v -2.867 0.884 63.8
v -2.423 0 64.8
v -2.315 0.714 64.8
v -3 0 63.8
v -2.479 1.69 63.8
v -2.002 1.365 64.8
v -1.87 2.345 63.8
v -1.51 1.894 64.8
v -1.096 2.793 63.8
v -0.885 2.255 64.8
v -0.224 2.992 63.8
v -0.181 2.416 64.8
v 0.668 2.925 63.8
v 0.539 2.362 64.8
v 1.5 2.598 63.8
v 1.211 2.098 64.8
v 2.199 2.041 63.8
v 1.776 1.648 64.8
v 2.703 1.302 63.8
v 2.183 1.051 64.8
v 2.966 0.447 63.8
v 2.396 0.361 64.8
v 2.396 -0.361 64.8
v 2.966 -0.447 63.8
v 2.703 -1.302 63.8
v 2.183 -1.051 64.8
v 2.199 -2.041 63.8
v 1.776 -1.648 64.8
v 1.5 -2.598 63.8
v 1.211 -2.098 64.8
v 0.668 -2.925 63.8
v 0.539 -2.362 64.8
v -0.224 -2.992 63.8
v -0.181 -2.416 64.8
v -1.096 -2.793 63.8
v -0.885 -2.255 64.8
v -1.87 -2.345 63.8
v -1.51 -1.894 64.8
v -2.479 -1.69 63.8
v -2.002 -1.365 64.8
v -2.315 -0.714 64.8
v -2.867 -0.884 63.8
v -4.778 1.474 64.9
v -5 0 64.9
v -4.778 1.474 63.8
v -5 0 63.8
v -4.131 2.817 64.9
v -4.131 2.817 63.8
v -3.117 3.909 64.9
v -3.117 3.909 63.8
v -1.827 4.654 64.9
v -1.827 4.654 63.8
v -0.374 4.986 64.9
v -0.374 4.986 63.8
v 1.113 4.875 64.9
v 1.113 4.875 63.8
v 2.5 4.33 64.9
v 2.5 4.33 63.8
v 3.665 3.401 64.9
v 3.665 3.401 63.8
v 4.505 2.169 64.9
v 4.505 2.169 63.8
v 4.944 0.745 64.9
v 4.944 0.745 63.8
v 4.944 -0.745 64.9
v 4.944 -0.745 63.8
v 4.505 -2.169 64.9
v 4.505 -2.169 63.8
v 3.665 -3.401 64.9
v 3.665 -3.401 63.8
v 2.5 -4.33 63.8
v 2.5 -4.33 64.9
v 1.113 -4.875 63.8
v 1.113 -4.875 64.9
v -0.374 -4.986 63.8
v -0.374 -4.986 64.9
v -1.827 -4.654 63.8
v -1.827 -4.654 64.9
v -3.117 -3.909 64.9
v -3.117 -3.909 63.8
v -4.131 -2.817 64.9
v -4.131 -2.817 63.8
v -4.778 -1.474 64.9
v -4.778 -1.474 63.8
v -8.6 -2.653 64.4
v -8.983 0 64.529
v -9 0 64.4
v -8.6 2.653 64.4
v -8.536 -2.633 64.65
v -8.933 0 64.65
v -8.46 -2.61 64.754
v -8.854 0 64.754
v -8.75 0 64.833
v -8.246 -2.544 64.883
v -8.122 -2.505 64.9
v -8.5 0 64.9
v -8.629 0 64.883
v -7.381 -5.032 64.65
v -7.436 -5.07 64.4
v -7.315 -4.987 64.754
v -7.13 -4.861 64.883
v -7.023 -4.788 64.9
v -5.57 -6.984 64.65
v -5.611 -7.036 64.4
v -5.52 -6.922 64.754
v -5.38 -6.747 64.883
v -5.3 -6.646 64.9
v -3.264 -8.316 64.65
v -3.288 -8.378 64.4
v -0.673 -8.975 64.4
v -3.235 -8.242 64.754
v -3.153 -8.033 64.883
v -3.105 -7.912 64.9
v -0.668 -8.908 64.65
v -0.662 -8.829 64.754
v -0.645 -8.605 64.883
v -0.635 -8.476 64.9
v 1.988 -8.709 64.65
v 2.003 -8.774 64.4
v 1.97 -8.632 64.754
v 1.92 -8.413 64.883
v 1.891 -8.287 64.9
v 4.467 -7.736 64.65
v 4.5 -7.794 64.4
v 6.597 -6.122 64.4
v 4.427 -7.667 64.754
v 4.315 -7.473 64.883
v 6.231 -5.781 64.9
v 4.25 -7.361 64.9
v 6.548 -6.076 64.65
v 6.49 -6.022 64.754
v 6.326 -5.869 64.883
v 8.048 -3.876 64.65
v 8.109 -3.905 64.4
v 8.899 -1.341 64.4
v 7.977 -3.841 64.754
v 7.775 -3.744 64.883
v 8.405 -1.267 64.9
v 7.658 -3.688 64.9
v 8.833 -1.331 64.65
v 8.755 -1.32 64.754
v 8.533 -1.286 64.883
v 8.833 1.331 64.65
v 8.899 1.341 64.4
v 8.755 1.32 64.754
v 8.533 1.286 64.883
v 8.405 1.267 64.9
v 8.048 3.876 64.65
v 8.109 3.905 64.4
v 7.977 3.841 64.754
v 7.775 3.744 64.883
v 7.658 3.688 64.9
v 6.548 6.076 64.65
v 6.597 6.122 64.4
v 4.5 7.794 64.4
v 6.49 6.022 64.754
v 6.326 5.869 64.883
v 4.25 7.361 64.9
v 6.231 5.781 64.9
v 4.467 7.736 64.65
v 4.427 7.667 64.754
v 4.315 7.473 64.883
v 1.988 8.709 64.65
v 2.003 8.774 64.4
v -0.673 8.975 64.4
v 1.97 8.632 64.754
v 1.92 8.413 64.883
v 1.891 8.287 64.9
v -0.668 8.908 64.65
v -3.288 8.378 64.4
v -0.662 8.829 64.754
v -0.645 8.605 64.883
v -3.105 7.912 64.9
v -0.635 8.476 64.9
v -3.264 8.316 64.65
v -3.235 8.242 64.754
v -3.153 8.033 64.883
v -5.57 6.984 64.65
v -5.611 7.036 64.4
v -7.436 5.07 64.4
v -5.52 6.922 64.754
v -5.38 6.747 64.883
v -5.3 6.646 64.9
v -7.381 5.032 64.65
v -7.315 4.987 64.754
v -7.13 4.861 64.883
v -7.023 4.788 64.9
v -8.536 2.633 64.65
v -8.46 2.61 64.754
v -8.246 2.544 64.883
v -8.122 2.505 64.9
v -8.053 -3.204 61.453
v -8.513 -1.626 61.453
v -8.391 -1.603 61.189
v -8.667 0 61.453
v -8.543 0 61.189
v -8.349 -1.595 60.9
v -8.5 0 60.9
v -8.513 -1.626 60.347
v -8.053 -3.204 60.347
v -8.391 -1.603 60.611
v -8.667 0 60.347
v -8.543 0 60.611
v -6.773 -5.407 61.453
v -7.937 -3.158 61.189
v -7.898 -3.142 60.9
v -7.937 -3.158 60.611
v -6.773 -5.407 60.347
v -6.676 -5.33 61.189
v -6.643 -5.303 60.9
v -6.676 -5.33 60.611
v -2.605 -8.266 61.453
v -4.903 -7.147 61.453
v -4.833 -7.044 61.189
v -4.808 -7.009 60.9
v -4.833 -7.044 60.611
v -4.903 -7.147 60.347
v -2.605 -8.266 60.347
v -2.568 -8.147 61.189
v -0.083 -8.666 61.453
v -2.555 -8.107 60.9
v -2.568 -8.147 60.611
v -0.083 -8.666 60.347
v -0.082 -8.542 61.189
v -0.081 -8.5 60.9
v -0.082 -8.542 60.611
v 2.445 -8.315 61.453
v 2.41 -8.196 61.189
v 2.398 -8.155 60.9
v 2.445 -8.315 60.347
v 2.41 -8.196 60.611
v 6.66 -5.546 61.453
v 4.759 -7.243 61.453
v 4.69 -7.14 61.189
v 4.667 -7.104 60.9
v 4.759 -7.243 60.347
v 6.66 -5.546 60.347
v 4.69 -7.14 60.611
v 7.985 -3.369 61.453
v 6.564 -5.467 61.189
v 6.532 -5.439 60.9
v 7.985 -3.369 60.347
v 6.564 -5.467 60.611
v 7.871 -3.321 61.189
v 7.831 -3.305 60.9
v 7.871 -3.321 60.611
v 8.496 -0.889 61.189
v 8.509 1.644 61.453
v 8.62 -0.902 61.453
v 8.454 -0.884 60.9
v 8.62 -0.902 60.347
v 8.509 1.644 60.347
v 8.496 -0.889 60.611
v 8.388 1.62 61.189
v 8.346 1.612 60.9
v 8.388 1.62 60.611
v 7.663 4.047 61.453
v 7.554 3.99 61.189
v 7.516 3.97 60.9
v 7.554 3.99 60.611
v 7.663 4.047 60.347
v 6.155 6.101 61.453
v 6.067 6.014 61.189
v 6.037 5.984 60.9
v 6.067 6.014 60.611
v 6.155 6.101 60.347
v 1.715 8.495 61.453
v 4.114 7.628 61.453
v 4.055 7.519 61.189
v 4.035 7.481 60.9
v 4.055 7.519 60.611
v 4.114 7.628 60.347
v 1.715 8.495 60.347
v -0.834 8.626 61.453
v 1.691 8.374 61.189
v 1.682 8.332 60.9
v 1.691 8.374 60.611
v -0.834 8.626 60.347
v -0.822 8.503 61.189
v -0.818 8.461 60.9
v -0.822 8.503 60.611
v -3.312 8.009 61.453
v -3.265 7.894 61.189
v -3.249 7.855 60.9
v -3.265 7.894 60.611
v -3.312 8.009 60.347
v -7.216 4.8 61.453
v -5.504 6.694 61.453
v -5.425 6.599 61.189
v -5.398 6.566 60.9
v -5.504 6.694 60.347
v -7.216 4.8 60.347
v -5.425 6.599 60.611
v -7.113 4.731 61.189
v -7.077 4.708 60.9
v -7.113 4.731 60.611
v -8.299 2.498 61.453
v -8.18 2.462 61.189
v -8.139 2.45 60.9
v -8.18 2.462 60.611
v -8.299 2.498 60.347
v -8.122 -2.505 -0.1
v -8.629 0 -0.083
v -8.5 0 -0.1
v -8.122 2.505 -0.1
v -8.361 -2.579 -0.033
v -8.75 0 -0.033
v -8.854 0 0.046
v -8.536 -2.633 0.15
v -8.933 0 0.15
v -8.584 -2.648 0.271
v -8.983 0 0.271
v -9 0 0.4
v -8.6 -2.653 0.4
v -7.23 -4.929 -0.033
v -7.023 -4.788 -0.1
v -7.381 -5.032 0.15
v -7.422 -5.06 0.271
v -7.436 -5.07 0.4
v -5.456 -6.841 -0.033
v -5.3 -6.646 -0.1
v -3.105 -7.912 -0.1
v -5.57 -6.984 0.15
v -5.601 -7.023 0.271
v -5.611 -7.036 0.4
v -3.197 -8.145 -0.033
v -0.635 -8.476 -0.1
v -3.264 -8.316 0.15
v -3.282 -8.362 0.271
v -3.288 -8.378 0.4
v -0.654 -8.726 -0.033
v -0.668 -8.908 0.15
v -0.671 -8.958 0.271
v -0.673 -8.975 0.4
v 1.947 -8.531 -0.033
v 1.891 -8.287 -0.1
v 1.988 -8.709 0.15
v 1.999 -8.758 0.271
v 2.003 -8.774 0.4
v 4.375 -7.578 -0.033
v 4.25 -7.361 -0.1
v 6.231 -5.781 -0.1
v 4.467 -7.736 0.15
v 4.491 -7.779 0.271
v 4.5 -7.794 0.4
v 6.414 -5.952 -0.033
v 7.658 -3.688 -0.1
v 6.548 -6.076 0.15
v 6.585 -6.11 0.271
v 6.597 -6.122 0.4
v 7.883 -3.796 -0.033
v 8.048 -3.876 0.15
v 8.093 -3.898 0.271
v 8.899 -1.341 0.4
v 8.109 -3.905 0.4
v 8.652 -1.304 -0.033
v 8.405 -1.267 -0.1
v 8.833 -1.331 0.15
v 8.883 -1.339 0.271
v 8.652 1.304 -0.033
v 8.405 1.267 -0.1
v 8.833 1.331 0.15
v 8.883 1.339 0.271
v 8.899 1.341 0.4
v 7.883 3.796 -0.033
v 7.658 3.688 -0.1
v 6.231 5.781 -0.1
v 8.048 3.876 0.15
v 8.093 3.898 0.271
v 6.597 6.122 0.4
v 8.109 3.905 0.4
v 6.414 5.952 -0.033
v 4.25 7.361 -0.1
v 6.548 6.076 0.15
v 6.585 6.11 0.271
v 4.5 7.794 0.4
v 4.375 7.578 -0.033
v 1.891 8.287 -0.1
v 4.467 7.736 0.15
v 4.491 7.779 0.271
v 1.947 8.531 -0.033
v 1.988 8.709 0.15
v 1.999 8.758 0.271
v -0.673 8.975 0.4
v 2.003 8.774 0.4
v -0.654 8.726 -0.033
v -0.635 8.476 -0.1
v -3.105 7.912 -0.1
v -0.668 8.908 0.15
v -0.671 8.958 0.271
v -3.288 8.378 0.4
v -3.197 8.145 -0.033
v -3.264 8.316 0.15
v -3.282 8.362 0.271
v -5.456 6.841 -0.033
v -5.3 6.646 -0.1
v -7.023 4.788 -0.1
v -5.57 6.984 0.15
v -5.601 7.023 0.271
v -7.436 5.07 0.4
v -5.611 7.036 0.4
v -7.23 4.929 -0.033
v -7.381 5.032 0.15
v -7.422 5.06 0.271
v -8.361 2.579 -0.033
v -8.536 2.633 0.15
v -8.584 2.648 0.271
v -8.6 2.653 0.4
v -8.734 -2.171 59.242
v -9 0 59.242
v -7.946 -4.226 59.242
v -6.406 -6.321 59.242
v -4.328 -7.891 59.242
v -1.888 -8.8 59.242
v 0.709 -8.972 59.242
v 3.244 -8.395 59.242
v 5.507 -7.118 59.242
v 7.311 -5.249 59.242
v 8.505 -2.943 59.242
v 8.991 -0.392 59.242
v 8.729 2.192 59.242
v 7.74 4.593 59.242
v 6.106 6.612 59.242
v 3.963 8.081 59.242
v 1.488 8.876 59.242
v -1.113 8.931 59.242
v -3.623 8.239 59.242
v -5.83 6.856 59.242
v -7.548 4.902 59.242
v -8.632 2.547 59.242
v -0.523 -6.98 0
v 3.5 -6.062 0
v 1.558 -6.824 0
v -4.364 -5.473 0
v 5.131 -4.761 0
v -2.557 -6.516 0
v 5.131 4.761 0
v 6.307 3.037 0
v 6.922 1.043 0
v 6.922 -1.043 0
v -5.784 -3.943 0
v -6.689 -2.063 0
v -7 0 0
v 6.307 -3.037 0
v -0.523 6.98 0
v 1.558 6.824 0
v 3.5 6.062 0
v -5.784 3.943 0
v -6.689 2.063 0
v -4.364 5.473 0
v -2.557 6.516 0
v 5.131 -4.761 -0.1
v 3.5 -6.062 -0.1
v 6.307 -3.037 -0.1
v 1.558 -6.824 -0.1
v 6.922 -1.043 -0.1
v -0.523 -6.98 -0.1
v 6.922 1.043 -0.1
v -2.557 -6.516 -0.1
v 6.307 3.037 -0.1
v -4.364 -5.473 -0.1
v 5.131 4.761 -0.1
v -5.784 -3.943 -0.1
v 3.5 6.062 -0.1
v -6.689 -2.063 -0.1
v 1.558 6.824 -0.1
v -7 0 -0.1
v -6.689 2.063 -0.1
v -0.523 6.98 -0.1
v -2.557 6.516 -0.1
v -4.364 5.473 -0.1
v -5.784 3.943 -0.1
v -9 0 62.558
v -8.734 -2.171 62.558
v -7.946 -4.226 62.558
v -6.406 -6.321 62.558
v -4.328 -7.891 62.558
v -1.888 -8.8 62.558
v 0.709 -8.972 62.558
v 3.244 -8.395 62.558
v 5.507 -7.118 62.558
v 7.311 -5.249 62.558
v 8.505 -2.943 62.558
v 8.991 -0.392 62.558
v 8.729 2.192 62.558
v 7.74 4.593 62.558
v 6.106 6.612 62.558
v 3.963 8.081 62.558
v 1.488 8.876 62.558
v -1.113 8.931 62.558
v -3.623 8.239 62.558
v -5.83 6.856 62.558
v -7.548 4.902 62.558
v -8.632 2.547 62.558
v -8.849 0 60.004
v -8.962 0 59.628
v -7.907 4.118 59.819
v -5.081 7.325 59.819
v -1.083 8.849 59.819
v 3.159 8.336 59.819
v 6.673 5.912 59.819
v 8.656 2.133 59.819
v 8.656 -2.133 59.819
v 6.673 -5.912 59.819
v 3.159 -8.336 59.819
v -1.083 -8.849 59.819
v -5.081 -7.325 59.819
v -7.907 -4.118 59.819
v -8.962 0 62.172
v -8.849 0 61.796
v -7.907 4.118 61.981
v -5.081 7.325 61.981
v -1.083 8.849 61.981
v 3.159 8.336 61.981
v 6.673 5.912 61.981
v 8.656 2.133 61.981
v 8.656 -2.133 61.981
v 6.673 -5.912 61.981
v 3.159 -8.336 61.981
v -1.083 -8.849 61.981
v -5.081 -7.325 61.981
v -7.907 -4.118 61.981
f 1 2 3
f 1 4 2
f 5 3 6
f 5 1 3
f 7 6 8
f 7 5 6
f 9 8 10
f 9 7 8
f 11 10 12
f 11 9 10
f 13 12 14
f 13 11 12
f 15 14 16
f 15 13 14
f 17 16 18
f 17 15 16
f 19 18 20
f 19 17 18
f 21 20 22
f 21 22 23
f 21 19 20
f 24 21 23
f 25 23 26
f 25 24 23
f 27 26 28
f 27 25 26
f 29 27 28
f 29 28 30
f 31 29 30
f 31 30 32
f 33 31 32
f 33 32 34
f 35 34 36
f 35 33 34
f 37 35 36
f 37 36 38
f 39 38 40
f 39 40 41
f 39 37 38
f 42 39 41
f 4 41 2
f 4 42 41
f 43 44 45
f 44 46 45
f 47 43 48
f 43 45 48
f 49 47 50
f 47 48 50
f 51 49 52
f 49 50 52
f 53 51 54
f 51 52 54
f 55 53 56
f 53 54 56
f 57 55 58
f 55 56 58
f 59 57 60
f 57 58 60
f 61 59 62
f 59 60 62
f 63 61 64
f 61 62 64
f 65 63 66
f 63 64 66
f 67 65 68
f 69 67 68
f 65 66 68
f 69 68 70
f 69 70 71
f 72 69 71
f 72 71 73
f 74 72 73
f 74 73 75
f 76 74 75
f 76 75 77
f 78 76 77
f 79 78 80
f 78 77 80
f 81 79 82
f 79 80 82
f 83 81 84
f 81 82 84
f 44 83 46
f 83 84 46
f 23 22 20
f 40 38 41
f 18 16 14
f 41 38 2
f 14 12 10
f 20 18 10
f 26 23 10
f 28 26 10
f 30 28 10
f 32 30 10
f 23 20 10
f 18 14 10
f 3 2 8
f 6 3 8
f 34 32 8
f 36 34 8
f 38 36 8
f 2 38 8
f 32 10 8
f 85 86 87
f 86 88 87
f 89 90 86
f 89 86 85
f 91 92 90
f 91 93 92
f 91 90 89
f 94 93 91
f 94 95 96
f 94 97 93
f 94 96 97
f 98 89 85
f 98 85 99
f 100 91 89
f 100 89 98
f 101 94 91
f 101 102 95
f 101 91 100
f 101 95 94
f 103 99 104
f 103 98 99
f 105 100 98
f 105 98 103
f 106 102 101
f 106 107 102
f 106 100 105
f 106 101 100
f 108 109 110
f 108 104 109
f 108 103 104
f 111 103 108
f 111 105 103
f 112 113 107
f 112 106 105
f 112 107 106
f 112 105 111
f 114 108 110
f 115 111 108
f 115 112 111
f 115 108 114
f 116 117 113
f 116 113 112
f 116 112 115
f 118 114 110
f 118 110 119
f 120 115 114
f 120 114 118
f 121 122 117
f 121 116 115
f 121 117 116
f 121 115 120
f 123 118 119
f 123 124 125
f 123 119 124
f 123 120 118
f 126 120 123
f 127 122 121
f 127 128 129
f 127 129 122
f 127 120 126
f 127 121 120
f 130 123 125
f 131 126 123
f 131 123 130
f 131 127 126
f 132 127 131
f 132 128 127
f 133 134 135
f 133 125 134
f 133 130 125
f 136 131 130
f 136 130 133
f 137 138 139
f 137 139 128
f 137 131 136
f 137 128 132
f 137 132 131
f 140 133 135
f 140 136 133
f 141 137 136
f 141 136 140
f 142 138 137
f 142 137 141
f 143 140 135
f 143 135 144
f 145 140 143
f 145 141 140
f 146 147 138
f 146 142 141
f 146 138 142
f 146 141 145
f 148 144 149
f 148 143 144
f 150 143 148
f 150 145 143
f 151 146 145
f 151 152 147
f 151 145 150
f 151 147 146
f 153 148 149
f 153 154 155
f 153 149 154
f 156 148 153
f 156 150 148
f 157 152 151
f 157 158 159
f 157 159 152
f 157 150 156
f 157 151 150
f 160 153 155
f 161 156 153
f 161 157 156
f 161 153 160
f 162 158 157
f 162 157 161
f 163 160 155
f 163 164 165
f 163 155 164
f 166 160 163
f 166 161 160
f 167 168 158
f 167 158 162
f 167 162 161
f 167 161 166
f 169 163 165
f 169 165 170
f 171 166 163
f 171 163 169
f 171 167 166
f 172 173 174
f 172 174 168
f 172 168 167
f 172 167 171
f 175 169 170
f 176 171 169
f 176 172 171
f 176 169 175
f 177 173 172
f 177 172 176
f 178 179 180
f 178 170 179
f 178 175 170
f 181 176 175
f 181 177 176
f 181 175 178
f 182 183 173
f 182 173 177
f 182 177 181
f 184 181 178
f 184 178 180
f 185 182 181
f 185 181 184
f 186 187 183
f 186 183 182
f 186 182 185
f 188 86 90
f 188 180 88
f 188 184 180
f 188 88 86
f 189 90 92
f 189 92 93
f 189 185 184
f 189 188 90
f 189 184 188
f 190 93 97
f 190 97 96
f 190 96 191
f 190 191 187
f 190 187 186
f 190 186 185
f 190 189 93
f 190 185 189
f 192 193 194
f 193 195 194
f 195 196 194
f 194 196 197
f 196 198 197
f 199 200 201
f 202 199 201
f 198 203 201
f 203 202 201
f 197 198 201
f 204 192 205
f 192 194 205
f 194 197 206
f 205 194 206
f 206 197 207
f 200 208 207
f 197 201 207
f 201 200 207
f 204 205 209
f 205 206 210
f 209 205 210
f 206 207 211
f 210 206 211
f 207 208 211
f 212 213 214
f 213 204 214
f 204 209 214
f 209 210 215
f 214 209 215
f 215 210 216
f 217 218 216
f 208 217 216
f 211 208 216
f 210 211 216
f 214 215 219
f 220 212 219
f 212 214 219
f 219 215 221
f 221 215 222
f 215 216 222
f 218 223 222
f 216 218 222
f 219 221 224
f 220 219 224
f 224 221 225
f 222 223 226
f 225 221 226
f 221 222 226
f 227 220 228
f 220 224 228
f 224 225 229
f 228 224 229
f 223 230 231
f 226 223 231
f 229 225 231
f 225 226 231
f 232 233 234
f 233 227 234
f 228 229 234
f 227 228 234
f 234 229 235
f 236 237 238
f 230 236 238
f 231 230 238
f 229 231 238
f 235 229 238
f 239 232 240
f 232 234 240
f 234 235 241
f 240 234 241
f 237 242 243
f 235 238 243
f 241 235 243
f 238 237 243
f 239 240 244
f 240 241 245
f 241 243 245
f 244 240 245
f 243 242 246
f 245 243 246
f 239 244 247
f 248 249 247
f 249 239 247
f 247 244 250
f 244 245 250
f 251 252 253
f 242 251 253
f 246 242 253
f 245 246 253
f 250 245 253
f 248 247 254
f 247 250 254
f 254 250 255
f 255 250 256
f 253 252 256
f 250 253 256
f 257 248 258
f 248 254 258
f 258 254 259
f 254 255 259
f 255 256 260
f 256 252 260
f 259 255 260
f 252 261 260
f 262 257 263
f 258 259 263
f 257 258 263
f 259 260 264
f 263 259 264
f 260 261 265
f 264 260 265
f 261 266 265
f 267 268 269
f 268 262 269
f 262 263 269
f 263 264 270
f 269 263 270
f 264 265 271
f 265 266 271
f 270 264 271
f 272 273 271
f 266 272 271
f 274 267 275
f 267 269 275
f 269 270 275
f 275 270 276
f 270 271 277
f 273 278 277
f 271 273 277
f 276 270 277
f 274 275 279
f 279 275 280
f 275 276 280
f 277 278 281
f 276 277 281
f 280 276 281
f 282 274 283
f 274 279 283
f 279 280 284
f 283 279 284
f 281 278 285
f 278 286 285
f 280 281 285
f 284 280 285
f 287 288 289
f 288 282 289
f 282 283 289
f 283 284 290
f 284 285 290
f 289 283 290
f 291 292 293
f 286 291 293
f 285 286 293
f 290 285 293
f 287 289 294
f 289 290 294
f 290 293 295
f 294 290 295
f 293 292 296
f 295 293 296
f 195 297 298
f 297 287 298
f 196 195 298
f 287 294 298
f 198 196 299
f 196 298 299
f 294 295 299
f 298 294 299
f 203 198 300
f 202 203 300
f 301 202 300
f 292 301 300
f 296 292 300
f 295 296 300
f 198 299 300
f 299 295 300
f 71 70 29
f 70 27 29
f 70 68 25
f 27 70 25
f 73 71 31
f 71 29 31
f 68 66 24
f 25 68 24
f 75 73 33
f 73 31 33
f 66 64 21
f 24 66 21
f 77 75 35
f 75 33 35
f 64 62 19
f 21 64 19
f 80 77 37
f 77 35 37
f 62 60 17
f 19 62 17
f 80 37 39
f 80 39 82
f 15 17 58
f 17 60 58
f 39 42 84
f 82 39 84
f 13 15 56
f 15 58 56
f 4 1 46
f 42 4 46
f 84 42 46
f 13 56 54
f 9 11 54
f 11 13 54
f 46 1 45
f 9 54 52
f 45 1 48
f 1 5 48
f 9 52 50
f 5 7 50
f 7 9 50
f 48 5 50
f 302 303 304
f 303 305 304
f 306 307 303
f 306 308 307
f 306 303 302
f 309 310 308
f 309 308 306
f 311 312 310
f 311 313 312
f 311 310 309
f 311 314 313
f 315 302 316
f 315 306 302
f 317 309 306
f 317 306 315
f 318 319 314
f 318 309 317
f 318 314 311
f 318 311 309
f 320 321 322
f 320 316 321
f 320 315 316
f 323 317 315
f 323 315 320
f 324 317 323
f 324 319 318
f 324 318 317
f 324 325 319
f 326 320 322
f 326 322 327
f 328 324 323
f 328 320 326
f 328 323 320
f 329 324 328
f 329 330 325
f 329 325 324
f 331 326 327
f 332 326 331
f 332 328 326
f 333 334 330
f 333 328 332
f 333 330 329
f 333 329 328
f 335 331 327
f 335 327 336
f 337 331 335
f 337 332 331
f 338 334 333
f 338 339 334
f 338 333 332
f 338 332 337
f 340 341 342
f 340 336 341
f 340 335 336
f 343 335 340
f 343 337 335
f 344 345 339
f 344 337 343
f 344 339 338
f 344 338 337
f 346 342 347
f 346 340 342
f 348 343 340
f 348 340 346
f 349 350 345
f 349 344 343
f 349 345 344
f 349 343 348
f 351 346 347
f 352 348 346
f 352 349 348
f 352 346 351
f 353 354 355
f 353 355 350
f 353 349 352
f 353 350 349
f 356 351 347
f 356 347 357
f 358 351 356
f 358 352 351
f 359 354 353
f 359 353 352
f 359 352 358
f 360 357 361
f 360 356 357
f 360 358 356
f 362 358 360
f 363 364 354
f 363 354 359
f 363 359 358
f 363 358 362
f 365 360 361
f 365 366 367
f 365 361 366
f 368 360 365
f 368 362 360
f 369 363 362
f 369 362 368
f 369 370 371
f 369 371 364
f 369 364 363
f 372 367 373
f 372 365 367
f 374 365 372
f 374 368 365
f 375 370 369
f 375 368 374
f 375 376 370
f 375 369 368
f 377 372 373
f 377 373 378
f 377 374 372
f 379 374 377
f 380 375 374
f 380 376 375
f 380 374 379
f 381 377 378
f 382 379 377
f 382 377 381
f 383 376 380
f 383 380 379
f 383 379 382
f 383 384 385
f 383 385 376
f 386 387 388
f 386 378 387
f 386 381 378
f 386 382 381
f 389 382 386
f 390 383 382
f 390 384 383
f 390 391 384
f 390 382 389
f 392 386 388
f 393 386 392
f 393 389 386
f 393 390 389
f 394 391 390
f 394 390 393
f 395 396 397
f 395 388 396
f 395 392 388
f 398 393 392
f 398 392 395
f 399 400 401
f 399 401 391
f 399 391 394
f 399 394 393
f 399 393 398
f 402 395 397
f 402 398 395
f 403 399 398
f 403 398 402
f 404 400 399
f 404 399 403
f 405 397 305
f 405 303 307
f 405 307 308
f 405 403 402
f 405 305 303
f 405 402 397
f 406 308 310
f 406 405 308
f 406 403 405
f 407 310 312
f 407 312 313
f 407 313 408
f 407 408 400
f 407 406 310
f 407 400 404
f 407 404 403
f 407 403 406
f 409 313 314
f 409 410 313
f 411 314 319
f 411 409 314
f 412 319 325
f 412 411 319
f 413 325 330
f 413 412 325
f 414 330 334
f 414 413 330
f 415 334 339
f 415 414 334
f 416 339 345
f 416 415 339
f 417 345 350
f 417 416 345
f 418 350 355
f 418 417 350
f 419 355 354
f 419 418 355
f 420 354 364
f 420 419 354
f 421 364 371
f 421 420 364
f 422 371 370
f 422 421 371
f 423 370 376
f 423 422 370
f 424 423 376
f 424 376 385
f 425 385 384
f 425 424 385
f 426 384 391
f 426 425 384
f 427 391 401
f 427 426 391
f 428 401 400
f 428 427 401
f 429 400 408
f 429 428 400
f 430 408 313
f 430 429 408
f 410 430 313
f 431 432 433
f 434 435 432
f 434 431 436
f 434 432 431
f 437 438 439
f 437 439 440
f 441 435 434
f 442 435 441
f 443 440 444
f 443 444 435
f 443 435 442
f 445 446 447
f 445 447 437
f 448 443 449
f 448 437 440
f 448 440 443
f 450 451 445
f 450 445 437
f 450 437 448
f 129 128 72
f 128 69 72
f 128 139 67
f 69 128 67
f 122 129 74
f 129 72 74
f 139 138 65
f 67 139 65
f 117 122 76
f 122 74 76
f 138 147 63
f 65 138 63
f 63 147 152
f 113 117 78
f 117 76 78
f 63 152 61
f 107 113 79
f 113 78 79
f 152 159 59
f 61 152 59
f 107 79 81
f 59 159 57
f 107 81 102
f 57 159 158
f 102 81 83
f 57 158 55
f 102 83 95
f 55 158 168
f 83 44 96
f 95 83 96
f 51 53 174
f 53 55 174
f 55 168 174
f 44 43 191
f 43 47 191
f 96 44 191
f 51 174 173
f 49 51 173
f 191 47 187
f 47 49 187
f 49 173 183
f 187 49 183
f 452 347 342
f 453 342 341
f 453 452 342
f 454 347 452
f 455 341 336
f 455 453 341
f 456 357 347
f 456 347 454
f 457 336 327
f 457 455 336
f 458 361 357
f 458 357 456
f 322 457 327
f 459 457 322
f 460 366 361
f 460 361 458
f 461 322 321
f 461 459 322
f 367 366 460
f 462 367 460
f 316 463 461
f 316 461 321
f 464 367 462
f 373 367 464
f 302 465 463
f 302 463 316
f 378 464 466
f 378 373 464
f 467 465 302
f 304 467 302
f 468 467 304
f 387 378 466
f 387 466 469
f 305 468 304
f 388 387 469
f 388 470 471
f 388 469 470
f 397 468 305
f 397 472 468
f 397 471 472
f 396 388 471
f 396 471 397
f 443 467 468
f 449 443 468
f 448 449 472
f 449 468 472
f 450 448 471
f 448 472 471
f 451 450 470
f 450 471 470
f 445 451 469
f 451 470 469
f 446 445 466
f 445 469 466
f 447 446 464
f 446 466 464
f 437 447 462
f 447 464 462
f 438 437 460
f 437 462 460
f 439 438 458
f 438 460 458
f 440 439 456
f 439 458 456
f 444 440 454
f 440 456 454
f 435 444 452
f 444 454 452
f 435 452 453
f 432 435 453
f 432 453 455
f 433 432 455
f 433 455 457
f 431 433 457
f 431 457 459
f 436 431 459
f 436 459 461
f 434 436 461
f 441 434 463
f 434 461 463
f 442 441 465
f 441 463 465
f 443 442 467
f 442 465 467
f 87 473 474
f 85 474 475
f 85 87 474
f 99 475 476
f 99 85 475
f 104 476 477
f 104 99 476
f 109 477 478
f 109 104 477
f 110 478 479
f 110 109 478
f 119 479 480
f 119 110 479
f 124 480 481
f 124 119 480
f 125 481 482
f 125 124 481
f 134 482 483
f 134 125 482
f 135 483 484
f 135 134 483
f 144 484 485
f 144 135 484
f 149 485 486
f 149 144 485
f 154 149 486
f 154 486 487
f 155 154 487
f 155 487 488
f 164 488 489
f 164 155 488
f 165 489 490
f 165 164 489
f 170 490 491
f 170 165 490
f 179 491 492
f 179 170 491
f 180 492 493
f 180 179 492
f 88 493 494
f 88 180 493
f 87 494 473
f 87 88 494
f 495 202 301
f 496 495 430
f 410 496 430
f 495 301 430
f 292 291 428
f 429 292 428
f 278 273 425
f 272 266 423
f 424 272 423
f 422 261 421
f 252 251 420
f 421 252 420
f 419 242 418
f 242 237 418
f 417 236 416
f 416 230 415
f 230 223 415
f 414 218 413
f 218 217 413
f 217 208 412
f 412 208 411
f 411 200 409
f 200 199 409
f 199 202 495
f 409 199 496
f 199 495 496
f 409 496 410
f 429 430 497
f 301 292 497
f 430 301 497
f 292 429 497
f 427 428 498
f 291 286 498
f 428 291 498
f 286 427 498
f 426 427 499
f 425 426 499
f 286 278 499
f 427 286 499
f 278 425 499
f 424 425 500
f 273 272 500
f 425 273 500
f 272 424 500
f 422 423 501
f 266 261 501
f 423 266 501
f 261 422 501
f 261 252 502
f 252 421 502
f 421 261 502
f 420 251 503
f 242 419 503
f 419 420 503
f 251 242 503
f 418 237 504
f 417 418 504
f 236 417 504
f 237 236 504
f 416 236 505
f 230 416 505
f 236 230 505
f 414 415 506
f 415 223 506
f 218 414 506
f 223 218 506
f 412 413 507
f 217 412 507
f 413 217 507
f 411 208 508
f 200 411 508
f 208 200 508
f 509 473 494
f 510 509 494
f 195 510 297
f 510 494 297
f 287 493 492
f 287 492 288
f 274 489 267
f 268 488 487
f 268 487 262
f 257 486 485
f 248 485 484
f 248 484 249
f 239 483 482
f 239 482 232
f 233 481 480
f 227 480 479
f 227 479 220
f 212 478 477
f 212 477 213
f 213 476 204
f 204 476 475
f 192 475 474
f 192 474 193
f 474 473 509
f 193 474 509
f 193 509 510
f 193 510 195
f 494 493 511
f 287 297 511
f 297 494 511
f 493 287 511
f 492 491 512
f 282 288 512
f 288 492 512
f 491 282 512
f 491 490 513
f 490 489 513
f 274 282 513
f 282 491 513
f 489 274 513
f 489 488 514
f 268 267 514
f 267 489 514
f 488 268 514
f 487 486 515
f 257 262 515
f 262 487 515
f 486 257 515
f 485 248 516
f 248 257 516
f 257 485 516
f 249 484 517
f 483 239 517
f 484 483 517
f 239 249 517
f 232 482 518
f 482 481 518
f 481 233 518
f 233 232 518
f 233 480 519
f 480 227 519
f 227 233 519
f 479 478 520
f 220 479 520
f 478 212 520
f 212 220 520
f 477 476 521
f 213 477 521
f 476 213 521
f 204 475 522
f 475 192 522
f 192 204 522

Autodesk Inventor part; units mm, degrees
ref_plane "YZ Plane" through (0, 0, 0) normal (1, 0, 0) x (0, 1, 0)
ref_plane "XZ Plane" through (0, 0, 0) normal (0, 1, 0) x (-1, 0, 0)
ref_plane "XY Plane" through (0, 0, 0) normal (0, 0, 1) x (1, 0, 0)
sketch "Skizze1" plane through (0, 0, 0) normal (0, 1, 0) x (-1, 0, 0)
  line L0 (0, 0) -> (7, 0)
  line L1 (7, 0) -> (7, -0.1)
  line L2 (7, -0.1) -> (8.5, -0.1)
  arc A0 (8.5, -0.1) -> (9, 0.4) centre (8.5, 0.4) ccw
  line L3 (9, 0.4) -> (9, 60.034)
  arc A1 (9, 61.766) -> (9, 60.034) centre (9.5, 60.9) ccw
  line L4 (9, 61.766) -> (9, 64.4)
  arc A2 (9, 64.4) -> (8.5, 64.9) centre (8.5, 64.4) ccw
  line L5 (8.5, 64.9) -> (5, 64.9)
  line L6 (5, 64.9) -> (5, 63.8)
  line L7 (5, 63.8) -> (3, 63.8)
  line L8 (3, 63.8) -> (2.4226, 64.8)
  line L9 (2.4226, 64.8) -> (0, 64.8)
  line L10 (0, 64.8) -> (0, 0)
  dimension "d4" = 18
  dimension "d5" = 1
  dimension "d6" = 19
  dimension "d7" = 0.5
  dimension "d8" = 0.1
  dimension "d9" = 14
  dimension "d10" = 1
  dimension "d11" = 10
  dimension "d12" = 6
  dimension "d13" = 4
  dimension "d14" = 60
  dimension "d17" = 0.1
  dimension "d18" = 65
revolve "Umdrehung1" add sketch "Skizze1" angle 360 about axis through (0, 0, 64.8) along (0, 0, -1)
fillet "Rundung1" radius 2 2 edges at (9, 0, 60.034) (9, 0, 61.766)
equation "\"d17\" = d8"
properties part number "18650"
